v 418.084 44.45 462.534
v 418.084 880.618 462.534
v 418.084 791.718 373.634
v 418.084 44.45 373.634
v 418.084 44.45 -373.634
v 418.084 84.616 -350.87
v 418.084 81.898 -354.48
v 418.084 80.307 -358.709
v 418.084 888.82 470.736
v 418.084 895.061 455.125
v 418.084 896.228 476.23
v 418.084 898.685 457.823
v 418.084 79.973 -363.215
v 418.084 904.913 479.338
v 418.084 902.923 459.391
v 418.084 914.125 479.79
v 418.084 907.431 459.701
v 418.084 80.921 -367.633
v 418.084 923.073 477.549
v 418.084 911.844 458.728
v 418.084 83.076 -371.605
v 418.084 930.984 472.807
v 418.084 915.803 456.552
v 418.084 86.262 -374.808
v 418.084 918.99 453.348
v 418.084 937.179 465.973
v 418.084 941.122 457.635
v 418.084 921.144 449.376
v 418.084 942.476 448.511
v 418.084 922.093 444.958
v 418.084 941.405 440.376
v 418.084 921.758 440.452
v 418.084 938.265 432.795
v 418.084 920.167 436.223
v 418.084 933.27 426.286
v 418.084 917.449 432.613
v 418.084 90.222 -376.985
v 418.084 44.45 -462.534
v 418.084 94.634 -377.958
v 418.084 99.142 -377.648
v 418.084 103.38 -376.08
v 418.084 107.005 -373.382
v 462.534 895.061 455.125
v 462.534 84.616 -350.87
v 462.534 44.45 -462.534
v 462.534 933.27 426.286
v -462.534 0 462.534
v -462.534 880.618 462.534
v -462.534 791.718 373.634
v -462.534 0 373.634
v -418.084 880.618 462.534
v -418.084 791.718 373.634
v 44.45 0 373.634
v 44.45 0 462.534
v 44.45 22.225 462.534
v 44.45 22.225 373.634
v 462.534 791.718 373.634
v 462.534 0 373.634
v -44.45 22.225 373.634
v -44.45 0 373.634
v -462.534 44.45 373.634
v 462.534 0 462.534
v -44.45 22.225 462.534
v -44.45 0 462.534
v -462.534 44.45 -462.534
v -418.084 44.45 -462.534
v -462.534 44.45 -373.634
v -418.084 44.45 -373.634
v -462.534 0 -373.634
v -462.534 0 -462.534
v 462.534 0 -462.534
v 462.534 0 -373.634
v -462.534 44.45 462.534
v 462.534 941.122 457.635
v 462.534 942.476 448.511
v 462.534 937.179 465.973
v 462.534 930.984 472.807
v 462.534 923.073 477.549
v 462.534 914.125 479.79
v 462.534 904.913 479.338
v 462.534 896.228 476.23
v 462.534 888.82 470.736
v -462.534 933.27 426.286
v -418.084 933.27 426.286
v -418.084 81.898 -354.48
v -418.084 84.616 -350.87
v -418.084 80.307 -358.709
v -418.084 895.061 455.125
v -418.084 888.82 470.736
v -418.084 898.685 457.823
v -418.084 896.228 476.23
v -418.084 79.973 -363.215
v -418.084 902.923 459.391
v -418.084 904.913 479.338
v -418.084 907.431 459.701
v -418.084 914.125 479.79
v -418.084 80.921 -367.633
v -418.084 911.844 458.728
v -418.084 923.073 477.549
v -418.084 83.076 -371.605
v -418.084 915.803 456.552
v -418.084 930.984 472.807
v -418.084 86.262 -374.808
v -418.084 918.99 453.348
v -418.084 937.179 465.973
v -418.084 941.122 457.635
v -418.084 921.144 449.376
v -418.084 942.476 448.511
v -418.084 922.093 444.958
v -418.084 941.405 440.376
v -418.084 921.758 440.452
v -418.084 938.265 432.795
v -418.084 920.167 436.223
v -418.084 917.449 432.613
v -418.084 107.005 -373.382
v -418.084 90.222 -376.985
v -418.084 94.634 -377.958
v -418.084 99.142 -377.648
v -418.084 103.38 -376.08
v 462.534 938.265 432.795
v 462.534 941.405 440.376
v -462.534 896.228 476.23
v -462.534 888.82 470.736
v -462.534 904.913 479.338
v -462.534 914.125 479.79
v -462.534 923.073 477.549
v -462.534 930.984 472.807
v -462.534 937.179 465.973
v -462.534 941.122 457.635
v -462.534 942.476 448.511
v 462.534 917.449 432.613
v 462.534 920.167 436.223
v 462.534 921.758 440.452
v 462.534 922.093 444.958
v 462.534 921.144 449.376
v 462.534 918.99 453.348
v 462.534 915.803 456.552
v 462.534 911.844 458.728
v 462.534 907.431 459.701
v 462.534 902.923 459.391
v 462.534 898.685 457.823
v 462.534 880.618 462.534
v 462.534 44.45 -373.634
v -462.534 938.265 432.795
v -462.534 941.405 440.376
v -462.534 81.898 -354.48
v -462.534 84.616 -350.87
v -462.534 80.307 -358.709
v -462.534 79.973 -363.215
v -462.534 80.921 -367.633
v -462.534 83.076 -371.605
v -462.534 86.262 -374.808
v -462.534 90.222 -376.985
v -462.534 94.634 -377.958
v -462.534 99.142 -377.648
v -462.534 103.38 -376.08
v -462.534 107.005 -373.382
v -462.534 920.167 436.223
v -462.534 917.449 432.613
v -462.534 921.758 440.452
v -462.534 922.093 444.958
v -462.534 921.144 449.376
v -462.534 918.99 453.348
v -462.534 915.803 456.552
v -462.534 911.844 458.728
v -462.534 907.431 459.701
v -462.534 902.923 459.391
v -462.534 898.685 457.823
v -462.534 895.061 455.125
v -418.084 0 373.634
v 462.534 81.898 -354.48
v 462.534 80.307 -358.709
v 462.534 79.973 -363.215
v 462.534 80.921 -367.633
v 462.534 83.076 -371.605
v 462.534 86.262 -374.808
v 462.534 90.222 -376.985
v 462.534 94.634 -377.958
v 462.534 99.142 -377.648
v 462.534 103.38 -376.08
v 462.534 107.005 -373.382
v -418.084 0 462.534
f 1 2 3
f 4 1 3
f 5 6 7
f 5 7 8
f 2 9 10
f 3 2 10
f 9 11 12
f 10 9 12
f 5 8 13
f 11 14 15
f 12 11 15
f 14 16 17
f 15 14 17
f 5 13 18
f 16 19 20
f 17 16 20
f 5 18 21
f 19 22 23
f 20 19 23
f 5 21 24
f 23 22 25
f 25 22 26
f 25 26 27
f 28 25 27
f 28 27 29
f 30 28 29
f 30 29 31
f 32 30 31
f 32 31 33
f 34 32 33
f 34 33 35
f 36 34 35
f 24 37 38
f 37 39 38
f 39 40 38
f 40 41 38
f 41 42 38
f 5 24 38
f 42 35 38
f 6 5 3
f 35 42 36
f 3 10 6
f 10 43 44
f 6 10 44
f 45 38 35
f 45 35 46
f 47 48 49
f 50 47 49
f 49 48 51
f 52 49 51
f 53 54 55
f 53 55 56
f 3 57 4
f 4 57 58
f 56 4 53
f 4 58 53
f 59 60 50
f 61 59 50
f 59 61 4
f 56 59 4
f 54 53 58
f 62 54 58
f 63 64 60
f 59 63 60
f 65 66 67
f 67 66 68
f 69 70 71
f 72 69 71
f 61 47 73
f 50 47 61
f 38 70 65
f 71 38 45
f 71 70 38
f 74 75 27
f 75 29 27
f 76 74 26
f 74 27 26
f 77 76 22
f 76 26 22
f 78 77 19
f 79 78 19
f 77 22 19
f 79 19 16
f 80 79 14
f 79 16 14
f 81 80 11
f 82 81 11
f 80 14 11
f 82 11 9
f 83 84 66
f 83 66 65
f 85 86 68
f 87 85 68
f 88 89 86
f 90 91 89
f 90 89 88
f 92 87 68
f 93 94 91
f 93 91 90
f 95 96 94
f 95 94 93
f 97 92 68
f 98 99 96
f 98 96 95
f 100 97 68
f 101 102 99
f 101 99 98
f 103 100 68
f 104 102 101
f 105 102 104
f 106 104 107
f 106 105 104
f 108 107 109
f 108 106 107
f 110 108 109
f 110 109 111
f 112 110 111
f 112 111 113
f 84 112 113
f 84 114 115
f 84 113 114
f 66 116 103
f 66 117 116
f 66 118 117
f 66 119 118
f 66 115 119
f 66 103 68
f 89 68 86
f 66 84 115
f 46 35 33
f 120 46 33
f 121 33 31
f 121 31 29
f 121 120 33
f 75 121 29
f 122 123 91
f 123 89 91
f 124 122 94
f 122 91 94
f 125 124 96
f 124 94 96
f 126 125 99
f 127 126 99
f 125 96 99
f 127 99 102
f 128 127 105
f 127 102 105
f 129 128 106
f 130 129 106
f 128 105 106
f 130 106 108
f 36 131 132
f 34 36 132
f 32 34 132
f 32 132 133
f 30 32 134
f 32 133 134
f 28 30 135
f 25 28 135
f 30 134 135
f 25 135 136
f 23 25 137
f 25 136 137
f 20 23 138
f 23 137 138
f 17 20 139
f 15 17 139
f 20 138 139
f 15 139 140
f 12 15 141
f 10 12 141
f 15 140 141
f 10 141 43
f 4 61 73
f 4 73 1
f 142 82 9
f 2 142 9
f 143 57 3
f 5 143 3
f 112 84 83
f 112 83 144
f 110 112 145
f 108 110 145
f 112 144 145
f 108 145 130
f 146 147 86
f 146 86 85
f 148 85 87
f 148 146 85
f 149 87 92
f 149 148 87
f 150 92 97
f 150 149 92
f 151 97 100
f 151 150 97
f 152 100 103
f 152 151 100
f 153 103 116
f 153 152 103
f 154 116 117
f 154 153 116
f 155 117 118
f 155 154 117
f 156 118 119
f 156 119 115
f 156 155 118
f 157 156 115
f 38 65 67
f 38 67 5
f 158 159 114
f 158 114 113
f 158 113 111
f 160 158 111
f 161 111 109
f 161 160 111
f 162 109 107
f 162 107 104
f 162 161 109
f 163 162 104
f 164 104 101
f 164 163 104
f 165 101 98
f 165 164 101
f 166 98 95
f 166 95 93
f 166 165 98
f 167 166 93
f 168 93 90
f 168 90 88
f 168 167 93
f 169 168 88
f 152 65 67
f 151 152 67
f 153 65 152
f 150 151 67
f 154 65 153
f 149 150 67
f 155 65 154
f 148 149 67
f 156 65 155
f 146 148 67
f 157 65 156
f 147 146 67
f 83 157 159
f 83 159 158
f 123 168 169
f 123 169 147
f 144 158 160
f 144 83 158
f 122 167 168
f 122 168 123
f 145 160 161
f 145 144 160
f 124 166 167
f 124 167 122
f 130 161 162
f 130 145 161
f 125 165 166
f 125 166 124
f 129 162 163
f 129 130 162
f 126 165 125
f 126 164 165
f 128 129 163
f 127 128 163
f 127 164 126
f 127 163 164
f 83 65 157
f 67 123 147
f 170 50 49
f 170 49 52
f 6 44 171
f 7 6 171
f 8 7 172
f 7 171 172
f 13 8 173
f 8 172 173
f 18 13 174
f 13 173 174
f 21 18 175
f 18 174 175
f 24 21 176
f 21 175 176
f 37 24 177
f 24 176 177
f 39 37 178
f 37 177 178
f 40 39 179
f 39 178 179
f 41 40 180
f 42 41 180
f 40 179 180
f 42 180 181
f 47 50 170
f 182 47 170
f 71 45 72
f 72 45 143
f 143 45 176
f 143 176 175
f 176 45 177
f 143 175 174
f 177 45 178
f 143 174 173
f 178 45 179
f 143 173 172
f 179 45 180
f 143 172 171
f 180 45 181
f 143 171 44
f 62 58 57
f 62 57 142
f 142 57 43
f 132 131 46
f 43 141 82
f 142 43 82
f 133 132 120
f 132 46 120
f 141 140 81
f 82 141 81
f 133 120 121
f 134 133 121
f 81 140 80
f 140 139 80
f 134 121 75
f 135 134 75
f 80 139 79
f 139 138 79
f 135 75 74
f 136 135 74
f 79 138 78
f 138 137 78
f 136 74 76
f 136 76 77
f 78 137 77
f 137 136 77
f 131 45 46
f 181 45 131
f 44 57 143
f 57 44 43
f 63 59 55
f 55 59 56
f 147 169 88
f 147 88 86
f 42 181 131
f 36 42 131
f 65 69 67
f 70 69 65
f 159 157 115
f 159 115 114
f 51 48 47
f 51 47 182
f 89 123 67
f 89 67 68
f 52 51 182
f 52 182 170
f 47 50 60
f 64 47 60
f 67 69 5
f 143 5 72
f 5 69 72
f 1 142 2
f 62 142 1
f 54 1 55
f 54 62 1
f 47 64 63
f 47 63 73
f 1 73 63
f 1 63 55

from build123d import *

# Parameters (mm, degrees)
SKETCH2_W                       = 925.068
SKETCH2_H                       = 88.9
BOSS_EXTRUDE1_DEPTH             = 44.45
BOSS_EXTRUDE1_2_DEPTH           = 44.45
SKETCH4_W                       = 44.45
SKETCH4_H                       = 88.9
FILLET1_R                       = 31.430896
CUT_EXTRUDE1_DEPTH              = 44.45
BOSS_EXTRUDE2_REACH             = 1120.361
SKETCH6_W                       = 44.45
SKETCH6_H                       = 88.9
BOSS_EXTRUDE2_DIRECTION_2_DEPTH = 44.45
FILLET1_OF_MIRROR8_R            = 31.430896
SKETCH1_W                       = 88.9
SKETCH1_H                       = 254
CUT_EXTRUDE2_DEPTH              = 22.225


with BuildPart() as part:
    # Sketch2 → Boss-Extrude1 (new body)
    with BuildSketch(Plane(origin=(0, 0, 0), x_dir=(1, 0, 0), z_dir=(0, 1, 0))):
        with Locations((0, 418.084)):
            Rectangle(SKETCH2_W, SKETCH2_H)
    extrude(amount=BOSS_EXTRUDE1_DEPTH)


with BuildPart() as body_2:
    # Sketch2 → Boss-Extrude1 2 (new body)
    with BuildSketch(Plane(origin=(0, 0, 0), x_dir=(1, 0, 0), z_dir=(0, 1, 0))):
        with Locations((0, -418.084)):
            Rectangle(SKETCH2_W, SKETCH2_H)
    extrude(amount=BOSS_EXTRUDE1_2_DEPTH)


with BuildPart() as body_3:
    # Sweep1: sweep along a path in Sketch3
    with BuildLine(Plane.ZY.offset(462.534)) as sweep1_path:
        Line((-462.534, 44.45), (435.491612107, 942.475612107))
    # Sketch4 → Sweep1 (sweep)
    with BuildSketch(Plane(origin=(0, 44.45, 0), x_dir=(1, 0, 0), z_dir=(0, 1, 0))):
        with Locations((-440.309, 418.084)):
            Rectangle(SKETCH4_W, SKETCH4_H)
    sweep1 = sweep(path=sweep1_path.line)

    # Fillet1
    fillet1_edges = [body_3.edges().sort_by_distance(p)[0] for p in [
        (-440.309, 942.475612107, 524.391612107),
        (-440.309, 942.475612107, 435.491612107),
    ]]
    fillet(fillet1_edges, radius=FILLET1_R)

    # Sketch5 → Cut-Extrude1 (cut)
    with BuildSketch(Plane.ZY.offset(462.534)):
        with BuildLine():
            Line((-373.382309225, 107.004633733), (432.613028854, 917.449274035))
            ThreePointArc((432.613028854, 917.449274035), (455.063584109, 917.5110699), (455.125379974, 895.060514644))
            Line((455.125379974, 895.060514644), (-350.869958105, 84.615874342))
            ThreePointArc((-350.869958105, 84.615874342), (-373.32051336, 84.554078477), (-373.382309225, 107.004633733))
        make_face()
    cut_extrude1 = extrude(amount=-CUT_EXTRUDE1_DEPTH, mode=Mode.SUBTRACT)


with BuildPart() as body_4:

    # Boss-Extrude2: up to this face of the body (flat: up to its plane)
    boss_extrude2_end = Plane(body_3.part.faces().sort_by_distance((-440.309, 466.634858203, 48.550858203))[0])
    # Sketch6 → Boss-Extrude2 (new, up to the picked face)
    with BuildSketch(Plane(origin=(0, 44.45, 0), x_dir=(1, 0, 0), z_dir=(0, 1, 0)), mode=Mode.PRIVATE) as boss_extrude2_sk1:
        with Locations((-440.309, -418.084)):
            Rectangle(SKETCH6_W, SKETCH6_H)
    boss_extrude2_tool1 = split(extrude(boss_extrude2_sk1.sketch, amount=BOSS_EXTRUDE2_REACH, mode=Mode.PRIVATE), bisect_by=boss_extrude2_end, keep=Keep.BOTH, mode=Mode.PRIVATE)
    boss_extrude2 = boss_extrude2_tool1.solids().sort_by(Axis((-440.309, 44.45, 418.084), (0, 1, 0)))[0]
    add(boss_extrude2)

    # Sketch6 → Boss-Extrude2 direction 2 (add)
    with BuildSketch(Plane(origin=(0, 44.45, 0), x_dir=(1, 0, 0), z_dir=(0, 1, 0))):
        with Locations((-440.309, -418.084)):
            Rectangle(SKETCH6_W, SKETCH6_H)
    boss_extrude2_direction_2 = extrude(amount=-BOSS_EXTRUDE2_DIRECTION_2_DEPTH)


with BuildPart() as body_2_1:
    add(body_2.part)

    # Mirror4: Boss-Extrude2, Boss-Extrude2 direction 2 across plane
    add(boss_extrude2.mirror(Plane(origin=(0, 0, 0), x_dir=(0, 0, 1), z_dir=(1, 0, 0))))
    add(boss_extrude2_direction_2.mirror(Plane(origin=(0, 0, 0), x_dir=(0, 0, 1), z_dir=(1, 0, 0))))


with BuildPart() as part_1:
    add(part.part)

    add(body_2_1.part)  # Mirror8 merges body 2
    # Mirror8: Sweep1 across plane
    add(sweep1.mirror(Plane(origin=(0, 0, 0), x_dir=(0, 0, 1), z_dir=(1, 0, 0))))

    # Mirror8 2: Cut-Extrude1 across plane
    add(cut_extrude1.mirror(Plane(origin=(0, 0, 0), x_dir=(0, 0, 1), z_dir=(1, 0, 0))), mode=Mode.SUBTRACT)

    # Fillet1 of Mirror8
    fillet1_of_mirror8_edges = [part_1.edges().sort_by_distance(p)[0] for p in [
        (440.309, 942.475612107, 524.391612107),
        (440.309, 942.475612107, 435.491612107),
    ]]
    fillet(fillet1_of_mirror8_edges, radius=FILLET1_OF_MIRROR8_R)

    # Sketch1 → Cut-Extrude2 (cut)
    with BuildSketch(Plane(origin=(0, 0, 0), x_dir=(1, 0, 0), z_dir=(0, 1, 0))):
        with Locations((0, -462.534)):
            Rectangle(SKETCH1_W, SKETCH1_H)
    extrude(amount=CUT_EXTRUDE2_DEPTH, mode=Mode.SUBTRACT)


solid = Compound([body_3.part, body_4.part, part_1.part])
